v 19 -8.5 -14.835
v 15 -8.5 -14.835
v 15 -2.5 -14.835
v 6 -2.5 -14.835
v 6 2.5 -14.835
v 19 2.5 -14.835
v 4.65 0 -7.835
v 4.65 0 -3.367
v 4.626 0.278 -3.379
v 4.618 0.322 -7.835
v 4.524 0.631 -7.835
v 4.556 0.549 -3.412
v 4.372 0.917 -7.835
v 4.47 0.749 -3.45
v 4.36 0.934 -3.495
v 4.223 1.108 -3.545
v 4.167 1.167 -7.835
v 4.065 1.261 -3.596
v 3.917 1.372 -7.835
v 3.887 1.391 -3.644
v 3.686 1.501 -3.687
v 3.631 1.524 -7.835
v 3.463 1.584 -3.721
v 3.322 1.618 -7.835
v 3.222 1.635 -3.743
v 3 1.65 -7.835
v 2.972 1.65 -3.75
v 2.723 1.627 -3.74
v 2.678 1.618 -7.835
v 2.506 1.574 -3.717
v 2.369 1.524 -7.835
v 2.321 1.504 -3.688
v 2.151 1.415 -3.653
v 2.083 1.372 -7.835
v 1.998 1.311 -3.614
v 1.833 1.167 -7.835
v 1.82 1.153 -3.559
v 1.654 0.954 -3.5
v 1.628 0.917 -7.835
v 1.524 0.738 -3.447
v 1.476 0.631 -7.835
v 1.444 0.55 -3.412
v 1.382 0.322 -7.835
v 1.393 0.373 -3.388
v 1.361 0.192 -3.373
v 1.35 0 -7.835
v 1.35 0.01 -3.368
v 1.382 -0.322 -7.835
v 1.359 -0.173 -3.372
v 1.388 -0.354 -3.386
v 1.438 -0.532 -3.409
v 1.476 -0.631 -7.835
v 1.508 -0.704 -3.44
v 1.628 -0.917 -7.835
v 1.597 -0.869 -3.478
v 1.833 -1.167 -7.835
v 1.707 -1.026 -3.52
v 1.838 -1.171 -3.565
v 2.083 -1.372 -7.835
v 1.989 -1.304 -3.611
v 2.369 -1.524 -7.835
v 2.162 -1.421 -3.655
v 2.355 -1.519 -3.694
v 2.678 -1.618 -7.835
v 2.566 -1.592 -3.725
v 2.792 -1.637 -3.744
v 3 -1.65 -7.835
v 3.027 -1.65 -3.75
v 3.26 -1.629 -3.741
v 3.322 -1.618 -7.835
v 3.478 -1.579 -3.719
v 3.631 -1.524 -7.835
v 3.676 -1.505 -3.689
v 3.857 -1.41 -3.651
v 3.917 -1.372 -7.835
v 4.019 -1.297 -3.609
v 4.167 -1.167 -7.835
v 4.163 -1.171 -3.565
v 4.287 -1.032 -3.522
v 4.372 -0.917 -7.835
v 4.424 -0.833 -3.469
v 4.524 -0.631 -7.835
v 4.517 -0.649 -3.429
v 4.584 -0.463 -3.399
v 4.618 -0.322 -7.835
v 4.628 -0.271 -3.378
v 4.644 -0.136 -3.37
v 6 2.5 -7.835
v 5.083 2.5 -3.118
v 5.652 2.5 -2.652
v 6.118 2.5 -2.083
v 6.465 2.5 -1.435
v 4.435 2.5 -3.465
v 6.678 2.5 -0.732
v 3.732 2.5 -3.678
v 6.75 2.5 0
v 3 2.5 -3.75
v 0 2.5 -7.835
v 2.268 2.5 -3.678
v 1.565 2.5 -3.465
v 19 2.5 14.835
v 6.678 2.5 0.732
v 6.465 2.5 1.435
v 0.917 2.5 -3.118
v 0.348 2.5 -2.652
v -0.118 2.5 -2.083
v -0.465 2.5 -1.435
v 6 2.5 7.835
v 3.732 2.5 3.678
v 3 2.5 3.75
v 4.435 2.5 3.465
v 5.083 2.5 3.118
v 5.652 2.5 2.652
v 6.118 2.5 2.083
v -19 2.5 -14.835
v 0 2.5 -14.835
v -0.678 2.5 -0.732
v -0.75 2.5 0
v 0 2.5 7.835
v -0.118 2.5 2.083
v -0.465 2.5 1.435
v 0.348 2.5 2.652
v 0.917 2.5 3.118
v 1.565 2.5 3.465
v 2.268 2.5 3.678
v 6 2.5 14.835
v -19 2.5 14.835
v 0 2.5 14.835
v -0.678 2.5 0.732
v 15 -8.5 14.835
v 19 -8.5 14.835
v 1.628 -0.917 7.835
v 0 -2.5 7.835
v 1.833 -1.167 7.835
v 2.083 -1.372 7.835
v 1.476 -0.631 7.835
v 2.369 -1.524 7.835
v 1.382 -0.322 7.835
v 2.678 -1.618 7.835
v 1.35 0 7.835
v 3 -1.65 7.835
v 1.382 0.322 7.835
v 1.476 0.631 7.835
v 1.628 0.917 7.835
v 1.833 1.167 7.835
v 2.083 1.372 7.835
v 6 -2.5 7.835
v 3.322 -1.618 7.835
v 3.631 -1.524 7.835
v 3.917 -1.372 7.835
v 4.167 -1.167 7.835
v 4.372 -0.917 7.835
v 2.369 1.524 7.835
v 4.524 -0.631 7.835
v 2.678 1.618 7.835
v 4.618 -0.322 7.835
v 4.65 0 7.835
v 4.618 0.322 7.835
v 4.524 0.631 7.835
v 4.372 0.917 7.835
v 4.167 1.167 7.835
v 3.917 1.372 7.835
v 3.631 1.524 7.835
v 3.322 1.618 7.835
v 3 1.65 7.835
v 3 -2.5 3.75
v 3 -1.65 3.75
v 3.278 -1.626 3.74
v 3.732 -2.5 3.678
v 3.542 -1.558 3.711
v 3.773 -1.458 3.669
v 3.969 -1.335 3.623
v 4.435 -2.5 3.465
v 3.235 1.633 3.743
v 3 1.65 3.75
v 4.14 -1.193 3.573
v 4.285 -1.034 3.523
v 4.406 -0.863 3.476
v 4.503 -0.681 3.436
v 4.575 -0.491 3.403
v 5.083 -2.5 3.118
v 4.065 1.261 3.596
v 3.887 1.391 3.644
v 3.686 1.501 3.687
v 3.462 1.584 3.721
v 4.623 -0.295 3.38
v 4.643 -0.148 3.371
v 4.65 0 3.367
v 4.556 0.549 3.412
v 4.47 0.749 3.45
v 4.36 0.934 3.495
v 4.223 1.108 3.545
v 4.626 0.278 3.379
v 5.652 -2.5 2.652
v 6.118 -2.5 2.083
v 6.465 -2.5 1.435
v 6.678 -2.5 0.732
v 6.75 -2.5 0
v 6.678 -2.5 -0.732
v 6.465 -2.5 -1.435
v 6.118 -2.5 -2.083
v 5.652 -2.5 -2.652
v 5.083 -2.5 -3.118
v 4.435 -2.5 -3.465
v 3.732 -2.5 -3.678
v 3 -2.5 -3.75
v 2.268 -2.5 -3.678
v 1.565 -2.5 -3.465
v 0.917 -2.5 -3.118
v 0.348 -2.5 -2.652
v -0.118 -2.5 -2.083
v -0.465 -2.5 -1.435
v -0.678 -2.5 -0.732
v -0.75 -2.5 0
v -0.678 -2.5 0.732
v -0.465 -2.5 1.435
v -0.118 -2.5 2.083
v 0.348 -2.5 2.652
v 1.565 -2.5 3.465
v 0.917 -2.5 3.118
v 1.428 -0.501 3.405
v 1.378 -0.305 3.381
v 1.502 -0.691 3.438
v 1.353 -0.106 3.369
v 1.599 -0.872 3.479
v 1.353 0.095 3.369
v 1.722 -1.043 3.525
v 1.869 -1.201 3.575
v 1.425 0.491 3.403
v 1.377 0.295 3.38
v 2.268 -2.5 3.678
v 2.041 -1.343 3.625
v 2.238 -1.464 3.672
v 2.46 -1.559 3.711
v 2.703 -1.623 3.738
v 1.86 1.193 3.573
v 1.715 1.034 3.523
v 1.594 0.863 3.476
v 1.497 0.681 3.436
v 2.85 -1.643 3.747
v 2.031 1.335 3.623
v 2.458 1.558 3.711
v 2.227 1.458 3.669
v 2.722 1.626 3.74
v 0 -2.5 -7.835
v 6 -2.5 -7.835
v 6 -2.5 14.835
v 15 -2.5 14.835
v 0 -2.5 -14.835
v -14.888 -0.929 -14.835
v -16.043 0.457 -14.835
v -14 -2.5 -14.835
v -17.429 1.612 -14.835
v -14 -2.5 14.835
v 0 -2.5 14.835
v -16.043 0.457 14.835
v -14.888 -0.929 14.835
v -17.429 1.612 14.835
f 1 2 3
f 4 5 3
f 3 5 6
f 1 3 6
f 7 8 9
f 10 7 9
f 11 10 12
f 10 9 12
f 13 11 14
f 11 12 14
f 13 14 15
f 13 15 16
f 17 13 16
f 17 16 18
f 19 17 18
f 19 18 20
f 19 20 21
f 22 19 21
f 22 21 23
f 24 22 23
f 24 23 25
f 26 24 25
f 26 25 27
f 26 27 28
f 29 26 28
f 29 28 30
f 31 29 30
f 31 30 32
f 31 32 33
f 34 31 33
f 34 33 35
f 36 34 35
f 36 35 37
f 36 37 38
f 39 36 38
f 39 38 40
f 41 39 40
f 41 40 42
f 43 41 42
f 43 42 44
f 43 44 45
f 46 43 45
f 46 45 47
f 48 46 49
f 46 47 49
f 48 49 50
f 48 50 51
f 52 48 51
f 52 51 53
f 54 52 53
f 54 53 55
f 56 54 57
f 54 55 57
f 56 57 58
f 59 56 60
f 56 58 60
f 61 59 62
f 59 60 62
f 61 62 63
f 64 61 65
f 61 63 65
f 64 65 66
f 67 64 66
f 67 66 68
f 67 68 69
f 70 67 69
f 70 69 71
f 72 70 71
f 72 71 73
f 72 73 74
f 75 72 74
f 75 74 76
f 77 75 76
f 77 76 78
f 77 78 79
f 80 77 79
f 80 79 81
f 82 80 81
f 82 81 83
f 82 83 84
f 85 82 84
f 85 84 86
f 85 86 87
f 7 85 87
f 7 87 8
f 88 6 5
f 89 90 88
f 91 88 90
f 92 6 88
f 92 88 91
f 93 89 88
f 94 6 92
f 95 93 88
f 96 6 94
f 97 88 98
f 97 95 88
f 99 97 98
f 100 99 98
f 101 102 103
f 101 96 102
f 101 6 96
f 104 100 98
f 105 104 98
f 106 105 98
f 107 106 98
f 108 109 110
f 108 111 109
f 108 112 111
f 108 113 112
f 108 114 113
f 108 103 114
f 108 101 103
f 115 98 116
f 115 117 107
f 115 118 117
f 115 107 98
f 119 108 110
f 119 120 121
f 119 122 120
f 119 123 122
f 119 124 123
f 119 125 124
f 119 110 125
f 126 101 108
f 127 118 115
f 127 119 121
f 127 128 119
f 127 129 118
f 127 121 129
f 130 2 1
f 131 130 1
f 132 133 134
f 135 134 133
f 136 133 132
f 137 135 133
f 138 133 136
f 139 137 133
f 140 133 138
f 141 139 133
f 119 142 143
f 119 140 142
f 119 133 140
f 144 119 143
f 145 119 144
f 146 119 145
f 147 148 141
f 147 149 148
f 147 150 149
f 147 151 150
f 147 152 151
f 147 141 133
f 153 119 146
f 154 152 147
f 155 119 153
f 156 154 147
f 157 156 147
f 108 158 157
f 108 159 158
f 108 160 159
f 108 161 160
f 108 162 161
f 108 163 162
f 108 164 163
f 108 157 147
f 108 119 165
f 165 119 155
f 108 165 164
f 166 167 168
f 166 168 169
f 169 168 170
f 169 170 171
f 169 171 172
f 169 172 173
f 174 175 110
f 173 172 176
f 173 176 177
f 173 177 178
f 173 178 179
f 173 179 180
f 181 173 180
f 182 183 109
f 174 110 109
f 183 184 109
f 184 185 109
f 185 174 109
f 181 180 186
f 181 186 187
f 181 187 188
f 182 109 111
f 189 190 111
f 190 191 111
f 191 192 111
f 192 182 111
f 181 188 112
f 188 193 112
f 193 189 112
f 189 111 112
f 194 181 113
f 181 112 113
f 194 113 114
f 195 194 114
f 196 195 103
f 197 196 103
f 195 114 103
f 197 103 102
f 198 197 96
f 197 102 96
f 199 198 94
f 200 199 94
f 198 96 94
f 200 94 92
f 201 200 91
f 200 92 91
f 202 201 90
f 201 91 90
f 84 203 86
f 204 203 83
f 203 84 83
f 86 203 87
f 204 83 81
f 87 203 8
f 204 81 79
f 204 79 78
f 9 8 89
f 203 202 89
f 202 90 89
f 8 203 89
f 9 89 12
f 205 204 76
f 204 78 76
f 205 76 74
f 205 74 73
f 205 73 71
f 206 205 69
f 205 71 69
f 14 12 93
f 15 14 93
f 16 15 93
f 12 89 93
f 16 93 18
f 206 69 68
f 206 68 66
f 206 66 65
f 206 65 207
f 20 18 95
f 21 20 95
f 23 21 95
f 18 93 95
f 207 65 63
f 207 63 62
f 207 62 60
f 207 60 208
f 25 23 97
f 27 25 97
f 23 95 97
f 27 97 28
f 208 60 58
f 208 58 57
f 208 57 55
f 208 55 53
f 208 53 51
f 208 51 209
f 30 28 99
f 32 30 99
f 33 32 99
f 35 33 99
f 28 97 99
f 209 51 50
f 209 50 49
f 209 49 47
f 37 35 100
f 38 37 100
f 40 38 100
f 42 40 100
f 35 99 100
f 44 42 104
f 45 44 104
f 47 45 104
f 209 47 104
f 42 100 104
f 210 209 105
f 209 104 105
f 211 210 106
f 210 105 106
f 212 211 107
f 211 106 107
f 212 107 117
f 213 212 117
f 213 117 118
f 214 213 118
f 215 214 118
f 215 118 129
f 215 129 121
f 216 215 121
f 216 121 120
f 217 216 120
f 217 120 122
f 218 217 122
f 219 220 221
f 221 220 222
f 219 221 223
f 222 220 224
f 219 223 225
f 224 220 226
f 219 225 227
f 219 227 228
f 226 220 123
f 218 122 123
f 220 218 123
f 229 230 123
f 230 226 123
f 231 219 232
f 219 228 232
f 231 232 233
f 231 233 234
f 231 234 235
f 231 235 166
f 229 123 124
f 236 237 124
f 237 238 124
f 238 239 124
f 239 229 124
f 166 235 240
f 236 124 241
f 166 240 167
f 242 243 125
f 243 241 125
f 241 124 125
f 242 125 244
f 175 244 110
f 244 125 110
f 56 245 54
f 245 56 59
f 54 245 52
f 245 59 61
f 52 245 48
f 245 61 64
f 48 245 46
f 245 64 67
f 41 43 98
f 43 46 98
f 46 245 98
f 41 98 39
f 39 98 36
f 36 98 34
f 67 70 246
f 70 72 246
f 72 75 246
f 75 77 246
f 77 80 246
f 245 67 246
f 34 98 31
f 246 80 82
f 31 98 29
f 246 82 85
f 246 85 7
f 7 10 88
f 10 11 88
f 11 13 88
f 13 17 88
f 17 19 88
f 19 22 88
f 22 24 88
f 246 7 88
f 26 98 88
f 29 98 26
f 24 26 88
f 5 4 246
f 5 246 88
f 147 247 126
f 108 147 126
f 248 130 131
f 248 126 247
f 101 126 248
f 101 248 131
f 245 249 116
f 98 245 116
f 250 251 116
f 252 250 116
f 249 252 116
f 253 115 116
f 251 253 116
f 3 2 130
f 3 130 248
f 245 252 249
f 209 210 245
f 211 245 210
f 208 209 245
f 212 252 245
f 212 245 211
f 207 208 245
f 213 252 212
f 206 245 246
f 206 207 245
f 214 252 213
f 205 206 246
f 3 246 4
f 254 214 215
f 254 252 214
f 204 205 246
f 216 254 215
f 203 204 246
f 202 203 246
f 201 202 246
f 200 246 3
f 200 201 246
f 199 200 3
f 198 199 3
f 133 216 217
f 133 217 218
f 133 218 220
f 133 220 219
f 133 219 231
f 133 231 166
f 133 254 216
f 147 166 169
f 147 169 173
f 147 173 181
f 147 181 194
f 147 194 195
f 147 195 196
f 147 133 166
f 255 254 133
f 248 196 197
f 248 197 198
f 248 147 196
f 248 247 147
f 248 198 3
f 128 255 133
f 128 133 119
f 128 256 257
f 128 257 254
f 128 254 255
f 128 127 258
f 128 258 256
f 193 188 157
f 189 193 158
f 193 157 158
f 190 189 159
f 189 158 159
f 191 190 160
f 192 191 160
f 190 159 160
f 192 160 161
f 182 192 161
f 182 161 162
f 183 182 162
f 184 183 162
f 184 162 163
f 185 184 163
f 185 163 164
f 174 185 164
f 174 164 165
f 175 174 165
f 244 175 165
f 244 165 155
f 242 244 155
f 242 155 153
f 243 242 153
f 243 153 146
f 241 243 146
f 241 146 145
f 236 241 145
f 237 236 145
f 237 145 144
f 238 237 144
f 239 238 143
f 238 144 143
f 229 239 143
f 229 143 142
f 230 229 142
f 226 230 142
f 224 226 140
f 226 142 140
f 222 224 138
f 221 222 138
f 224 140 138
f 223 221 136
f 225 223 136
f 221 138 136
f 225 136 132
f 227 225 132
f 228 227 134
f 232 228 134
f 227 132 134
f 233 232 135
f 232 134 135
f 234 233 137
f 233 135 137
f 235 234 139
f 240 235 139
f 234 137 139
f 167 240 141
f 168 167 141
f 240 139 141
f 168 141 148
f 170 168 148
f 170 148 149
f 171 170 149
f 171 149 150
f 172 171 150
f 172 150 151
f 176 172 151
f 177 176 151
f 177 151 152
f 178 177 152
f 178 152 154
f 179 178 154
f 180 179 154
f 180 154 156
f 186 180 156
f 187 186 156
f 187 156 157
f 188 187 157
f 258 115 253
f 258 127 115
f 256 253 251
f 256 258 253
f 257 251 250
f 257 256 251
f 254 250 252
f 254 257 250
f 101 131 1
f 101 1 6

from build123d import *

# Parameters (mm, degrees)
BOSS_EXTRUDE1_DEPTH = 14.835
CUT_EXTRUDE1_REACH  = 37.321
SKETCH4_R           = 1.65
SKETCH4_3_W         = 6
SKETCH4_3_H         = 5
SKETCH4_3_R         = 1.65
CUT_EXTRUDE3_DEPTH  = 7
CUT_EXTRUDE2_REACH  = 26.619
SKETCH5_R           = 3.75
SKETCH6_W           = 4
SKETCH6_H           = 6
BOSS_EXTRUDE2_DEPTH = 29.67


with BuildPart() as part:
    # Sketch3 → Boss-Extrude1 (new, symmetric)
    with BuildSketch(Plane.XY):
        with BuildLine():
            Line((-14, -2.5), (19, -2.5))
            Line((19, -2.5), (19, 2.5))
            Line((19, 2.5), (-19, 2.5))
            ThreePointArc((-19, 2.5), (-16.043310466, 0.456689534), (-14, -2.5))
        make_face()
    extrude(amount=BOSS_EXTRUDE1_DEPTH, both=True)

    # Sketch4 → Cut-Extrude1 (cut, up to next)
    with BuildSketch(Plane.XY.offset(14.835), mode=Mode.PRIVATE) as cut_extrude1_sk1:
        with Locations((3, 0)):
            Circle(SKETCH4_R)
    cut_extrude1_tool1 = extrude(cut_extrude1_sk1.sketch, amount=-CUT_EXTRUDE1_REACH, mode=Mode.PRIVATE) & part.part
    add(cut_extrude1_tool1.solids().sort_by_distance((3, 0, 14.835))[0], mode=Mode.SUBTRACT)

    # Sketch4<3> → Cut-Extrude3 (cut)
    with BuildSketch(Plane.XY.offset(14.835)):
        with Locations((3, 0)):
            Rectangle(SKETCH4_3_W, SKETCH4_3_H)
        with Locations((3, 0)):
            Circle(SKETCH4_3_R, mode=Mode.SUBTRACT)
    cut_extrude3 = extrude(amount=-CUT_EXTRUDE3_DEPTH, mode=Mode.SUBTRACT)

    # Mirror1: Cut-Extrude3 across plane
    add(cut_extrude3.mirror(Plane.XY), mode=Mode.SUBTRACT)

    # Sketch5 → Cut-Extrude2 (cut, up to next)
    with BuildSketch(Plane(origin=(0, 2.5, 0), x_dir=(1, 0, 0), z_dir=(0, 1, 0)), mode=Mode.PRIVATE) as cut_extrude2_sk1:
        with Locations(Location((3, 0, 0), (0, 0, 270))):
            Circle(SKETCH5_R)
    cut_extrude2_tool1 = extrude(cut_extrude2_sk1.sketch, amount=-CUT_EXTRUDE2_REACH, mode=Mode.PRIVATE) & part.part
    add(cut_extrude2_tool1.solids().sort_by_distance((3, 2.5, 0))[0], mode=Mode.SUBTRACT)

    # Sketch6 → Boss-Extrude2 (add)
    with BuildSketch(Plane.XY.offset(14.835)):
        with Locations((17, -5.5)):
            Rectangle(SKETCH6_W, SKETCH6_H)
    extrude(amount=-BOSS_EXTRUDE2_DEPTH)


solid = part.part
